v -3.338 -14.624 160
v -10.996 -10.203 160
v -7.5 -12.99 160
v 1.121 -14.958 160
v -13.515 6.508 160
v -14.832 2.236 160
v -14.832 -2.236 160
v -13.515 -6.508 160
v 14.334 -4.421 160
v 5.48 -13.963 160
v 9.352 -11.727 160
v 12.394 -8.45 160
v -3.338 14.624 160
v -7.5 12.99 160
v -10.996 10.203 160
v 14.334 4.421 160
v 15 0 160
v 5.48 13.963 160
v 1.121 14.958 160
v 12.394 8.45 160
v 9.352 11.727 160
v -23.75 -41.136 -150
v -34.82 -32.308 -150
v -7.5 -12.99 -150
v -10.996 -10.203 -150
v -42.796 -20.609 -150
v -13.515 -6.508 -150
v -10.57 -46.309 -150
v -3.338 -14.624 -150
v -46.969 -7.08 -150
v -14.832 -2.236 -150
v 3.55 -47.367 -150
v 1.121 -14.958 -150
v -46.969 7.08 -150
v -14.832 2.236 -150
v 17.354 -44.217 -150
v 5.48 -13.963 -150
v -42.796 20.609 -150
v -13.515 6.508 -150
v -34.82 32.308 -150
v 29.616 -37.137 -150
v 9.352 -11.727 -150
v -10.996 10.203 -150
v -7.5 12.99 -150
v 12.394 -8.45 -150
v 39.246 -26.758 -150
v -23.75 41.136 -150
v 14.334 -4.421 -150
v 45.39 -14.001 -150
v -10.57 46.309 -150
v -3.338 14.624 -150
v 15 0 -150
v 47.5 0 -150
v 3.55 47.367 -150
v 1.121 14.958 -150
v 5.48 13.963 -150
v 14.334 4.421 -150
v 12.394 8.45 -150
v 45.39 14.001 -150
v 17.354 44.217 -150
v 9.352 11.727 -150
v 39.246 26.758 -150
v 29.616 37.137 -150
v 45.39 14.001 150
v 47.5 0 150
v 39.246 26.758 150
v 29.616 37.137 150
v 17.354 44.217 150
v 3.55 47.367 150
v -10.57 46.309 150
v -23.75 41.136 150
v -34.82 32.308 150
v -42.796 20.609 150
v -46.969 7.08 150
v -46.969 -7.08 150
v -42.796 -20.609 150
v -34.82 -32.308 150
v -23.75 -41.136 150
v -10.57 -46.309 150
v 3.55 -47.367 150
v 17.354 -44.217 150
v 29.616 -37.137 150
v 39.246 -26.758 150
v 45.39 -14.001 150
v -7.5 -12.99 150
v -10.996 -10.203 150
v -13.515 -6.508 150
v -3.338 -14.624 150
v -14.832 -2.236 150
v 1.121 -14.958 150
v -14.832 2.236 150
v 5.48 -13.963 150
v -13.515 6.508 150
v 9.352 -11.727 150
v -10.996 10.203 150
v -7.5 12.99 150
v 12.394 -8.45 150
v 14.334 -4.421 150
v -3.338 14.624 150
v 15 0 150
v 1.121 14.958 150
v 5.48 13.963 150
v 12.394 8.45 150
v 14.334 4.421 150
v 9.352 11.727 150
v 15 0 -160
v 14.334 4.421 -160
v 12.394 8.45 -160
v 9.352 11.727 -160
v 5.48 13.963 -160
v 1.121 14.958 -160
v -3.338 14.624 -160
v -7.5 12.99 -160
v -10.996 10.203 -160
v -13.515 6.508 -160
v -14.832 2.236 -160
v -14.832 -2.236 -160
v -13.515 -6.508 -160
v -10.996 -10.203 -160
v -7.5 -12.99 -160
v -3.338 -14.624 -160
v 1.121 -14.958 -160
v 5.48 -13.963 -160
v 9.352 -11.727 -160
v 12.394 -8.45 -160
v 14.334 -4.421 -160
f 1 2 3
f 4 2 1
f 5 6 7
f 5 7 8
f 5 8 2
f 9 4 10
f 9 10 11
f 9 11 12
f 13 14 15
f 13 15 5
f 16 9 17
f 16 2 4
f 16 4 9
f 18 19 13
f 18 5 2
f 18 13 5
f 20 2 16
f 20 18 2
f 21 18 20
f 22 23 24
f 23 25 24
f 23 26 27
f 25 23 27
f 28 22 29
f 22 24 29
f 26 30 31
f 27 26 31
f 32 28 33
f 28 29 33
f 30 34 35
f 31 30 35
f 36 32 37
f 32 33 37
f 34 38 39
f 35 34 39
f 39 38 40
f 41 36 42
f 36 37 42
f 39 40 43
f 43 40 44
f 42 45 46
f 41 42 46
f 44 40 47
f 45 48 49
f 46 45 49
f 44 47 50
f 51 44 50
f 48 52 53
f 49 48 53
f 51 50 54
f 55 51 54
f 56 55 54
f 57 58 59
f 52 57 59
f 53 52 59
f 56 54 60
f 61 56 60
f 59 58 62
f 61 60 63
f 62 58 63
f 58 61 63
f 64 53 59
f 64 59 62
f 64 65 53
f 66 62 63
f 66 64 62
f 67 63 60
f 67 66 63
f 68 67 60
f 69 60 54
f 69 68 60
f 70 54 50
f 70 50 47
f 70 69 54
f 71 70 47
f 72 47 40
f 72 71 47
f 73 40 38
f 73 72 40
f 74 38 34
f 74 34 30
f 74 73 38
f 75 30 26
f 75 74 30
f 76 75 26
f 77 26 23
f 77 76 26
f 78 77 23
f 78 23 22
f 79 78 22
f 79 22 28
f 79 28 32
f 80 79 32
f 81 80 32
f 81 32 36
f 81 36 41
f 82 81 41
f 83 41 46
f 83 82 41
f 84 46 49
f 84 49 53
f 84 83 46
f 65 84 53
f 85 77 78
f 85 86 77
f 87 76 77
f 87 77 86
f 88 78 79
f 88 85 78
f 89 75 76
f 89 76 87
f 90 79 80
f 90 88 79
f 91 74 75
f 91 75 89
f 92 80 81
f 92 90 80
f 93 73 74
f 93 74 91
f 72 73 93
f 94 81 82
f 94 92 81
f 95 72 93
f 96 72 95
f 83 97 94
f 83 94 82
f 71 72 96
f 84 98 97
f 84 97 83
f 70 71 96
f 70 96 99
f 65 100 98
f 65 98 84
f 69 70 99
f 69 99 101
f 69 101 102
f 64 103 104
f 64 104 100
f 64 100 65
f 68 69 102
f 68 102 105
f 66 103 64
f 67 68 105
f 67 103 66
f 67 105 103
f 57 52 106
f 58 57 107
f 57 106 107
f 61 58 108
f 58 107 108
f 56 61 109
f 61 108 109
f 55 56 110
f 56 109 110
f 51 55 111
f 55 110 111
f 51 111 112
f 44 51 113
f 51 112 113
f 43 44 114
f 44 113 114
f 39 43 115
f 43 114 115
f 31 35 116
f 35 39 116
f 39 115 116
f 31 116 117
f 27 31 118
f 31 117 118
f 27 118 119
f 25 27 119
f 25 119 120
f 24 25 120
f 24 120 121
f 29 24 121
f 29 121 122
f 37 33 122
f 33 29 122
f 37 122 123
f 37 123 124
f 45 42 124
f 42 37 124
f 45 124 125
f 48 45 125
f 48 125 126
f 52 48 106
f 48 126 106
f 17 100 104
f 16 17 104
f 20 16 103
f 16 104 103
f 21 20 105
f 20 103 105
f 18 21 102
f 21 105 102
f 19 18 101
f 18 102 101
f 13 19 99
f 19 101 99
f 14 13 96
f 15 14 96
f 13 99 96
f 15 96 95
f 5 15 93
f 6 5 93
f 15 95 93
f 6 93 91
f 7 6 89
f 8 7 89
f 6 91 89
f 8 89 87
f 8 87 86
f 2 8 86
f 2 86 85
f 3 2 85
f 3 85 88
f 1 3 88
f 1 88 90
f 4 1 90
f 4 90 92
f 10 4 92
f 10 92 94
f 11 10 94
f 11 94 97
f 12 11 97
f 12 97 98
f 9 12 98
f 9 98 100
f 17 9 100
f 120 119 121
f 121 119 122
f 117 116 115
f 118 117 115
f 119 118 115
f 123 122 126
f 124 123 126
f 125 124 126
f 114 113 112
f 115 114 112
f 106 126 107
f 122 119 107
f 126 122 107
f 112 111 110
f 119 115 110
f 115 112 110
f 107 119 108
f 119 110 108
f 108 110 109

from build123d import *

# Parameters (mm, degrees)
SKETCH1_R                = 47.5
BOSS_EXTRUDE1_DEPTH      = 150
BOSS_EXTRUDE2_DEPTH      = 10
BOSS_EXTRUDE2_DEPTH_BACK = 310
SKETCH2_R                = 15


with BuildPart() as part:
    # Sketch1 → Boss-Extrude1 (new, symmetric)
    with BuildSketch(Plane.XY):
        Circle(SKETCH1_R)
    extrude(amount=BOSS_EXTRUDE1_DEPTH, both=True)

    # Sketch2 → Boss-Extrude2 (add, two sides: drawn at the far end of the back side and taken through both)
    with BuildSketch(Plane.XY.offset(150).offset(-BOSS_EXTRUDE2_DEPTH_BACK)):
        Circle(SKETCH2_R)
    extrude(amount=BOSS_EXTRUDE2_DEPTH + BOSS_EXTRUDE2_DEPTH_BACK)


solid = part.part
